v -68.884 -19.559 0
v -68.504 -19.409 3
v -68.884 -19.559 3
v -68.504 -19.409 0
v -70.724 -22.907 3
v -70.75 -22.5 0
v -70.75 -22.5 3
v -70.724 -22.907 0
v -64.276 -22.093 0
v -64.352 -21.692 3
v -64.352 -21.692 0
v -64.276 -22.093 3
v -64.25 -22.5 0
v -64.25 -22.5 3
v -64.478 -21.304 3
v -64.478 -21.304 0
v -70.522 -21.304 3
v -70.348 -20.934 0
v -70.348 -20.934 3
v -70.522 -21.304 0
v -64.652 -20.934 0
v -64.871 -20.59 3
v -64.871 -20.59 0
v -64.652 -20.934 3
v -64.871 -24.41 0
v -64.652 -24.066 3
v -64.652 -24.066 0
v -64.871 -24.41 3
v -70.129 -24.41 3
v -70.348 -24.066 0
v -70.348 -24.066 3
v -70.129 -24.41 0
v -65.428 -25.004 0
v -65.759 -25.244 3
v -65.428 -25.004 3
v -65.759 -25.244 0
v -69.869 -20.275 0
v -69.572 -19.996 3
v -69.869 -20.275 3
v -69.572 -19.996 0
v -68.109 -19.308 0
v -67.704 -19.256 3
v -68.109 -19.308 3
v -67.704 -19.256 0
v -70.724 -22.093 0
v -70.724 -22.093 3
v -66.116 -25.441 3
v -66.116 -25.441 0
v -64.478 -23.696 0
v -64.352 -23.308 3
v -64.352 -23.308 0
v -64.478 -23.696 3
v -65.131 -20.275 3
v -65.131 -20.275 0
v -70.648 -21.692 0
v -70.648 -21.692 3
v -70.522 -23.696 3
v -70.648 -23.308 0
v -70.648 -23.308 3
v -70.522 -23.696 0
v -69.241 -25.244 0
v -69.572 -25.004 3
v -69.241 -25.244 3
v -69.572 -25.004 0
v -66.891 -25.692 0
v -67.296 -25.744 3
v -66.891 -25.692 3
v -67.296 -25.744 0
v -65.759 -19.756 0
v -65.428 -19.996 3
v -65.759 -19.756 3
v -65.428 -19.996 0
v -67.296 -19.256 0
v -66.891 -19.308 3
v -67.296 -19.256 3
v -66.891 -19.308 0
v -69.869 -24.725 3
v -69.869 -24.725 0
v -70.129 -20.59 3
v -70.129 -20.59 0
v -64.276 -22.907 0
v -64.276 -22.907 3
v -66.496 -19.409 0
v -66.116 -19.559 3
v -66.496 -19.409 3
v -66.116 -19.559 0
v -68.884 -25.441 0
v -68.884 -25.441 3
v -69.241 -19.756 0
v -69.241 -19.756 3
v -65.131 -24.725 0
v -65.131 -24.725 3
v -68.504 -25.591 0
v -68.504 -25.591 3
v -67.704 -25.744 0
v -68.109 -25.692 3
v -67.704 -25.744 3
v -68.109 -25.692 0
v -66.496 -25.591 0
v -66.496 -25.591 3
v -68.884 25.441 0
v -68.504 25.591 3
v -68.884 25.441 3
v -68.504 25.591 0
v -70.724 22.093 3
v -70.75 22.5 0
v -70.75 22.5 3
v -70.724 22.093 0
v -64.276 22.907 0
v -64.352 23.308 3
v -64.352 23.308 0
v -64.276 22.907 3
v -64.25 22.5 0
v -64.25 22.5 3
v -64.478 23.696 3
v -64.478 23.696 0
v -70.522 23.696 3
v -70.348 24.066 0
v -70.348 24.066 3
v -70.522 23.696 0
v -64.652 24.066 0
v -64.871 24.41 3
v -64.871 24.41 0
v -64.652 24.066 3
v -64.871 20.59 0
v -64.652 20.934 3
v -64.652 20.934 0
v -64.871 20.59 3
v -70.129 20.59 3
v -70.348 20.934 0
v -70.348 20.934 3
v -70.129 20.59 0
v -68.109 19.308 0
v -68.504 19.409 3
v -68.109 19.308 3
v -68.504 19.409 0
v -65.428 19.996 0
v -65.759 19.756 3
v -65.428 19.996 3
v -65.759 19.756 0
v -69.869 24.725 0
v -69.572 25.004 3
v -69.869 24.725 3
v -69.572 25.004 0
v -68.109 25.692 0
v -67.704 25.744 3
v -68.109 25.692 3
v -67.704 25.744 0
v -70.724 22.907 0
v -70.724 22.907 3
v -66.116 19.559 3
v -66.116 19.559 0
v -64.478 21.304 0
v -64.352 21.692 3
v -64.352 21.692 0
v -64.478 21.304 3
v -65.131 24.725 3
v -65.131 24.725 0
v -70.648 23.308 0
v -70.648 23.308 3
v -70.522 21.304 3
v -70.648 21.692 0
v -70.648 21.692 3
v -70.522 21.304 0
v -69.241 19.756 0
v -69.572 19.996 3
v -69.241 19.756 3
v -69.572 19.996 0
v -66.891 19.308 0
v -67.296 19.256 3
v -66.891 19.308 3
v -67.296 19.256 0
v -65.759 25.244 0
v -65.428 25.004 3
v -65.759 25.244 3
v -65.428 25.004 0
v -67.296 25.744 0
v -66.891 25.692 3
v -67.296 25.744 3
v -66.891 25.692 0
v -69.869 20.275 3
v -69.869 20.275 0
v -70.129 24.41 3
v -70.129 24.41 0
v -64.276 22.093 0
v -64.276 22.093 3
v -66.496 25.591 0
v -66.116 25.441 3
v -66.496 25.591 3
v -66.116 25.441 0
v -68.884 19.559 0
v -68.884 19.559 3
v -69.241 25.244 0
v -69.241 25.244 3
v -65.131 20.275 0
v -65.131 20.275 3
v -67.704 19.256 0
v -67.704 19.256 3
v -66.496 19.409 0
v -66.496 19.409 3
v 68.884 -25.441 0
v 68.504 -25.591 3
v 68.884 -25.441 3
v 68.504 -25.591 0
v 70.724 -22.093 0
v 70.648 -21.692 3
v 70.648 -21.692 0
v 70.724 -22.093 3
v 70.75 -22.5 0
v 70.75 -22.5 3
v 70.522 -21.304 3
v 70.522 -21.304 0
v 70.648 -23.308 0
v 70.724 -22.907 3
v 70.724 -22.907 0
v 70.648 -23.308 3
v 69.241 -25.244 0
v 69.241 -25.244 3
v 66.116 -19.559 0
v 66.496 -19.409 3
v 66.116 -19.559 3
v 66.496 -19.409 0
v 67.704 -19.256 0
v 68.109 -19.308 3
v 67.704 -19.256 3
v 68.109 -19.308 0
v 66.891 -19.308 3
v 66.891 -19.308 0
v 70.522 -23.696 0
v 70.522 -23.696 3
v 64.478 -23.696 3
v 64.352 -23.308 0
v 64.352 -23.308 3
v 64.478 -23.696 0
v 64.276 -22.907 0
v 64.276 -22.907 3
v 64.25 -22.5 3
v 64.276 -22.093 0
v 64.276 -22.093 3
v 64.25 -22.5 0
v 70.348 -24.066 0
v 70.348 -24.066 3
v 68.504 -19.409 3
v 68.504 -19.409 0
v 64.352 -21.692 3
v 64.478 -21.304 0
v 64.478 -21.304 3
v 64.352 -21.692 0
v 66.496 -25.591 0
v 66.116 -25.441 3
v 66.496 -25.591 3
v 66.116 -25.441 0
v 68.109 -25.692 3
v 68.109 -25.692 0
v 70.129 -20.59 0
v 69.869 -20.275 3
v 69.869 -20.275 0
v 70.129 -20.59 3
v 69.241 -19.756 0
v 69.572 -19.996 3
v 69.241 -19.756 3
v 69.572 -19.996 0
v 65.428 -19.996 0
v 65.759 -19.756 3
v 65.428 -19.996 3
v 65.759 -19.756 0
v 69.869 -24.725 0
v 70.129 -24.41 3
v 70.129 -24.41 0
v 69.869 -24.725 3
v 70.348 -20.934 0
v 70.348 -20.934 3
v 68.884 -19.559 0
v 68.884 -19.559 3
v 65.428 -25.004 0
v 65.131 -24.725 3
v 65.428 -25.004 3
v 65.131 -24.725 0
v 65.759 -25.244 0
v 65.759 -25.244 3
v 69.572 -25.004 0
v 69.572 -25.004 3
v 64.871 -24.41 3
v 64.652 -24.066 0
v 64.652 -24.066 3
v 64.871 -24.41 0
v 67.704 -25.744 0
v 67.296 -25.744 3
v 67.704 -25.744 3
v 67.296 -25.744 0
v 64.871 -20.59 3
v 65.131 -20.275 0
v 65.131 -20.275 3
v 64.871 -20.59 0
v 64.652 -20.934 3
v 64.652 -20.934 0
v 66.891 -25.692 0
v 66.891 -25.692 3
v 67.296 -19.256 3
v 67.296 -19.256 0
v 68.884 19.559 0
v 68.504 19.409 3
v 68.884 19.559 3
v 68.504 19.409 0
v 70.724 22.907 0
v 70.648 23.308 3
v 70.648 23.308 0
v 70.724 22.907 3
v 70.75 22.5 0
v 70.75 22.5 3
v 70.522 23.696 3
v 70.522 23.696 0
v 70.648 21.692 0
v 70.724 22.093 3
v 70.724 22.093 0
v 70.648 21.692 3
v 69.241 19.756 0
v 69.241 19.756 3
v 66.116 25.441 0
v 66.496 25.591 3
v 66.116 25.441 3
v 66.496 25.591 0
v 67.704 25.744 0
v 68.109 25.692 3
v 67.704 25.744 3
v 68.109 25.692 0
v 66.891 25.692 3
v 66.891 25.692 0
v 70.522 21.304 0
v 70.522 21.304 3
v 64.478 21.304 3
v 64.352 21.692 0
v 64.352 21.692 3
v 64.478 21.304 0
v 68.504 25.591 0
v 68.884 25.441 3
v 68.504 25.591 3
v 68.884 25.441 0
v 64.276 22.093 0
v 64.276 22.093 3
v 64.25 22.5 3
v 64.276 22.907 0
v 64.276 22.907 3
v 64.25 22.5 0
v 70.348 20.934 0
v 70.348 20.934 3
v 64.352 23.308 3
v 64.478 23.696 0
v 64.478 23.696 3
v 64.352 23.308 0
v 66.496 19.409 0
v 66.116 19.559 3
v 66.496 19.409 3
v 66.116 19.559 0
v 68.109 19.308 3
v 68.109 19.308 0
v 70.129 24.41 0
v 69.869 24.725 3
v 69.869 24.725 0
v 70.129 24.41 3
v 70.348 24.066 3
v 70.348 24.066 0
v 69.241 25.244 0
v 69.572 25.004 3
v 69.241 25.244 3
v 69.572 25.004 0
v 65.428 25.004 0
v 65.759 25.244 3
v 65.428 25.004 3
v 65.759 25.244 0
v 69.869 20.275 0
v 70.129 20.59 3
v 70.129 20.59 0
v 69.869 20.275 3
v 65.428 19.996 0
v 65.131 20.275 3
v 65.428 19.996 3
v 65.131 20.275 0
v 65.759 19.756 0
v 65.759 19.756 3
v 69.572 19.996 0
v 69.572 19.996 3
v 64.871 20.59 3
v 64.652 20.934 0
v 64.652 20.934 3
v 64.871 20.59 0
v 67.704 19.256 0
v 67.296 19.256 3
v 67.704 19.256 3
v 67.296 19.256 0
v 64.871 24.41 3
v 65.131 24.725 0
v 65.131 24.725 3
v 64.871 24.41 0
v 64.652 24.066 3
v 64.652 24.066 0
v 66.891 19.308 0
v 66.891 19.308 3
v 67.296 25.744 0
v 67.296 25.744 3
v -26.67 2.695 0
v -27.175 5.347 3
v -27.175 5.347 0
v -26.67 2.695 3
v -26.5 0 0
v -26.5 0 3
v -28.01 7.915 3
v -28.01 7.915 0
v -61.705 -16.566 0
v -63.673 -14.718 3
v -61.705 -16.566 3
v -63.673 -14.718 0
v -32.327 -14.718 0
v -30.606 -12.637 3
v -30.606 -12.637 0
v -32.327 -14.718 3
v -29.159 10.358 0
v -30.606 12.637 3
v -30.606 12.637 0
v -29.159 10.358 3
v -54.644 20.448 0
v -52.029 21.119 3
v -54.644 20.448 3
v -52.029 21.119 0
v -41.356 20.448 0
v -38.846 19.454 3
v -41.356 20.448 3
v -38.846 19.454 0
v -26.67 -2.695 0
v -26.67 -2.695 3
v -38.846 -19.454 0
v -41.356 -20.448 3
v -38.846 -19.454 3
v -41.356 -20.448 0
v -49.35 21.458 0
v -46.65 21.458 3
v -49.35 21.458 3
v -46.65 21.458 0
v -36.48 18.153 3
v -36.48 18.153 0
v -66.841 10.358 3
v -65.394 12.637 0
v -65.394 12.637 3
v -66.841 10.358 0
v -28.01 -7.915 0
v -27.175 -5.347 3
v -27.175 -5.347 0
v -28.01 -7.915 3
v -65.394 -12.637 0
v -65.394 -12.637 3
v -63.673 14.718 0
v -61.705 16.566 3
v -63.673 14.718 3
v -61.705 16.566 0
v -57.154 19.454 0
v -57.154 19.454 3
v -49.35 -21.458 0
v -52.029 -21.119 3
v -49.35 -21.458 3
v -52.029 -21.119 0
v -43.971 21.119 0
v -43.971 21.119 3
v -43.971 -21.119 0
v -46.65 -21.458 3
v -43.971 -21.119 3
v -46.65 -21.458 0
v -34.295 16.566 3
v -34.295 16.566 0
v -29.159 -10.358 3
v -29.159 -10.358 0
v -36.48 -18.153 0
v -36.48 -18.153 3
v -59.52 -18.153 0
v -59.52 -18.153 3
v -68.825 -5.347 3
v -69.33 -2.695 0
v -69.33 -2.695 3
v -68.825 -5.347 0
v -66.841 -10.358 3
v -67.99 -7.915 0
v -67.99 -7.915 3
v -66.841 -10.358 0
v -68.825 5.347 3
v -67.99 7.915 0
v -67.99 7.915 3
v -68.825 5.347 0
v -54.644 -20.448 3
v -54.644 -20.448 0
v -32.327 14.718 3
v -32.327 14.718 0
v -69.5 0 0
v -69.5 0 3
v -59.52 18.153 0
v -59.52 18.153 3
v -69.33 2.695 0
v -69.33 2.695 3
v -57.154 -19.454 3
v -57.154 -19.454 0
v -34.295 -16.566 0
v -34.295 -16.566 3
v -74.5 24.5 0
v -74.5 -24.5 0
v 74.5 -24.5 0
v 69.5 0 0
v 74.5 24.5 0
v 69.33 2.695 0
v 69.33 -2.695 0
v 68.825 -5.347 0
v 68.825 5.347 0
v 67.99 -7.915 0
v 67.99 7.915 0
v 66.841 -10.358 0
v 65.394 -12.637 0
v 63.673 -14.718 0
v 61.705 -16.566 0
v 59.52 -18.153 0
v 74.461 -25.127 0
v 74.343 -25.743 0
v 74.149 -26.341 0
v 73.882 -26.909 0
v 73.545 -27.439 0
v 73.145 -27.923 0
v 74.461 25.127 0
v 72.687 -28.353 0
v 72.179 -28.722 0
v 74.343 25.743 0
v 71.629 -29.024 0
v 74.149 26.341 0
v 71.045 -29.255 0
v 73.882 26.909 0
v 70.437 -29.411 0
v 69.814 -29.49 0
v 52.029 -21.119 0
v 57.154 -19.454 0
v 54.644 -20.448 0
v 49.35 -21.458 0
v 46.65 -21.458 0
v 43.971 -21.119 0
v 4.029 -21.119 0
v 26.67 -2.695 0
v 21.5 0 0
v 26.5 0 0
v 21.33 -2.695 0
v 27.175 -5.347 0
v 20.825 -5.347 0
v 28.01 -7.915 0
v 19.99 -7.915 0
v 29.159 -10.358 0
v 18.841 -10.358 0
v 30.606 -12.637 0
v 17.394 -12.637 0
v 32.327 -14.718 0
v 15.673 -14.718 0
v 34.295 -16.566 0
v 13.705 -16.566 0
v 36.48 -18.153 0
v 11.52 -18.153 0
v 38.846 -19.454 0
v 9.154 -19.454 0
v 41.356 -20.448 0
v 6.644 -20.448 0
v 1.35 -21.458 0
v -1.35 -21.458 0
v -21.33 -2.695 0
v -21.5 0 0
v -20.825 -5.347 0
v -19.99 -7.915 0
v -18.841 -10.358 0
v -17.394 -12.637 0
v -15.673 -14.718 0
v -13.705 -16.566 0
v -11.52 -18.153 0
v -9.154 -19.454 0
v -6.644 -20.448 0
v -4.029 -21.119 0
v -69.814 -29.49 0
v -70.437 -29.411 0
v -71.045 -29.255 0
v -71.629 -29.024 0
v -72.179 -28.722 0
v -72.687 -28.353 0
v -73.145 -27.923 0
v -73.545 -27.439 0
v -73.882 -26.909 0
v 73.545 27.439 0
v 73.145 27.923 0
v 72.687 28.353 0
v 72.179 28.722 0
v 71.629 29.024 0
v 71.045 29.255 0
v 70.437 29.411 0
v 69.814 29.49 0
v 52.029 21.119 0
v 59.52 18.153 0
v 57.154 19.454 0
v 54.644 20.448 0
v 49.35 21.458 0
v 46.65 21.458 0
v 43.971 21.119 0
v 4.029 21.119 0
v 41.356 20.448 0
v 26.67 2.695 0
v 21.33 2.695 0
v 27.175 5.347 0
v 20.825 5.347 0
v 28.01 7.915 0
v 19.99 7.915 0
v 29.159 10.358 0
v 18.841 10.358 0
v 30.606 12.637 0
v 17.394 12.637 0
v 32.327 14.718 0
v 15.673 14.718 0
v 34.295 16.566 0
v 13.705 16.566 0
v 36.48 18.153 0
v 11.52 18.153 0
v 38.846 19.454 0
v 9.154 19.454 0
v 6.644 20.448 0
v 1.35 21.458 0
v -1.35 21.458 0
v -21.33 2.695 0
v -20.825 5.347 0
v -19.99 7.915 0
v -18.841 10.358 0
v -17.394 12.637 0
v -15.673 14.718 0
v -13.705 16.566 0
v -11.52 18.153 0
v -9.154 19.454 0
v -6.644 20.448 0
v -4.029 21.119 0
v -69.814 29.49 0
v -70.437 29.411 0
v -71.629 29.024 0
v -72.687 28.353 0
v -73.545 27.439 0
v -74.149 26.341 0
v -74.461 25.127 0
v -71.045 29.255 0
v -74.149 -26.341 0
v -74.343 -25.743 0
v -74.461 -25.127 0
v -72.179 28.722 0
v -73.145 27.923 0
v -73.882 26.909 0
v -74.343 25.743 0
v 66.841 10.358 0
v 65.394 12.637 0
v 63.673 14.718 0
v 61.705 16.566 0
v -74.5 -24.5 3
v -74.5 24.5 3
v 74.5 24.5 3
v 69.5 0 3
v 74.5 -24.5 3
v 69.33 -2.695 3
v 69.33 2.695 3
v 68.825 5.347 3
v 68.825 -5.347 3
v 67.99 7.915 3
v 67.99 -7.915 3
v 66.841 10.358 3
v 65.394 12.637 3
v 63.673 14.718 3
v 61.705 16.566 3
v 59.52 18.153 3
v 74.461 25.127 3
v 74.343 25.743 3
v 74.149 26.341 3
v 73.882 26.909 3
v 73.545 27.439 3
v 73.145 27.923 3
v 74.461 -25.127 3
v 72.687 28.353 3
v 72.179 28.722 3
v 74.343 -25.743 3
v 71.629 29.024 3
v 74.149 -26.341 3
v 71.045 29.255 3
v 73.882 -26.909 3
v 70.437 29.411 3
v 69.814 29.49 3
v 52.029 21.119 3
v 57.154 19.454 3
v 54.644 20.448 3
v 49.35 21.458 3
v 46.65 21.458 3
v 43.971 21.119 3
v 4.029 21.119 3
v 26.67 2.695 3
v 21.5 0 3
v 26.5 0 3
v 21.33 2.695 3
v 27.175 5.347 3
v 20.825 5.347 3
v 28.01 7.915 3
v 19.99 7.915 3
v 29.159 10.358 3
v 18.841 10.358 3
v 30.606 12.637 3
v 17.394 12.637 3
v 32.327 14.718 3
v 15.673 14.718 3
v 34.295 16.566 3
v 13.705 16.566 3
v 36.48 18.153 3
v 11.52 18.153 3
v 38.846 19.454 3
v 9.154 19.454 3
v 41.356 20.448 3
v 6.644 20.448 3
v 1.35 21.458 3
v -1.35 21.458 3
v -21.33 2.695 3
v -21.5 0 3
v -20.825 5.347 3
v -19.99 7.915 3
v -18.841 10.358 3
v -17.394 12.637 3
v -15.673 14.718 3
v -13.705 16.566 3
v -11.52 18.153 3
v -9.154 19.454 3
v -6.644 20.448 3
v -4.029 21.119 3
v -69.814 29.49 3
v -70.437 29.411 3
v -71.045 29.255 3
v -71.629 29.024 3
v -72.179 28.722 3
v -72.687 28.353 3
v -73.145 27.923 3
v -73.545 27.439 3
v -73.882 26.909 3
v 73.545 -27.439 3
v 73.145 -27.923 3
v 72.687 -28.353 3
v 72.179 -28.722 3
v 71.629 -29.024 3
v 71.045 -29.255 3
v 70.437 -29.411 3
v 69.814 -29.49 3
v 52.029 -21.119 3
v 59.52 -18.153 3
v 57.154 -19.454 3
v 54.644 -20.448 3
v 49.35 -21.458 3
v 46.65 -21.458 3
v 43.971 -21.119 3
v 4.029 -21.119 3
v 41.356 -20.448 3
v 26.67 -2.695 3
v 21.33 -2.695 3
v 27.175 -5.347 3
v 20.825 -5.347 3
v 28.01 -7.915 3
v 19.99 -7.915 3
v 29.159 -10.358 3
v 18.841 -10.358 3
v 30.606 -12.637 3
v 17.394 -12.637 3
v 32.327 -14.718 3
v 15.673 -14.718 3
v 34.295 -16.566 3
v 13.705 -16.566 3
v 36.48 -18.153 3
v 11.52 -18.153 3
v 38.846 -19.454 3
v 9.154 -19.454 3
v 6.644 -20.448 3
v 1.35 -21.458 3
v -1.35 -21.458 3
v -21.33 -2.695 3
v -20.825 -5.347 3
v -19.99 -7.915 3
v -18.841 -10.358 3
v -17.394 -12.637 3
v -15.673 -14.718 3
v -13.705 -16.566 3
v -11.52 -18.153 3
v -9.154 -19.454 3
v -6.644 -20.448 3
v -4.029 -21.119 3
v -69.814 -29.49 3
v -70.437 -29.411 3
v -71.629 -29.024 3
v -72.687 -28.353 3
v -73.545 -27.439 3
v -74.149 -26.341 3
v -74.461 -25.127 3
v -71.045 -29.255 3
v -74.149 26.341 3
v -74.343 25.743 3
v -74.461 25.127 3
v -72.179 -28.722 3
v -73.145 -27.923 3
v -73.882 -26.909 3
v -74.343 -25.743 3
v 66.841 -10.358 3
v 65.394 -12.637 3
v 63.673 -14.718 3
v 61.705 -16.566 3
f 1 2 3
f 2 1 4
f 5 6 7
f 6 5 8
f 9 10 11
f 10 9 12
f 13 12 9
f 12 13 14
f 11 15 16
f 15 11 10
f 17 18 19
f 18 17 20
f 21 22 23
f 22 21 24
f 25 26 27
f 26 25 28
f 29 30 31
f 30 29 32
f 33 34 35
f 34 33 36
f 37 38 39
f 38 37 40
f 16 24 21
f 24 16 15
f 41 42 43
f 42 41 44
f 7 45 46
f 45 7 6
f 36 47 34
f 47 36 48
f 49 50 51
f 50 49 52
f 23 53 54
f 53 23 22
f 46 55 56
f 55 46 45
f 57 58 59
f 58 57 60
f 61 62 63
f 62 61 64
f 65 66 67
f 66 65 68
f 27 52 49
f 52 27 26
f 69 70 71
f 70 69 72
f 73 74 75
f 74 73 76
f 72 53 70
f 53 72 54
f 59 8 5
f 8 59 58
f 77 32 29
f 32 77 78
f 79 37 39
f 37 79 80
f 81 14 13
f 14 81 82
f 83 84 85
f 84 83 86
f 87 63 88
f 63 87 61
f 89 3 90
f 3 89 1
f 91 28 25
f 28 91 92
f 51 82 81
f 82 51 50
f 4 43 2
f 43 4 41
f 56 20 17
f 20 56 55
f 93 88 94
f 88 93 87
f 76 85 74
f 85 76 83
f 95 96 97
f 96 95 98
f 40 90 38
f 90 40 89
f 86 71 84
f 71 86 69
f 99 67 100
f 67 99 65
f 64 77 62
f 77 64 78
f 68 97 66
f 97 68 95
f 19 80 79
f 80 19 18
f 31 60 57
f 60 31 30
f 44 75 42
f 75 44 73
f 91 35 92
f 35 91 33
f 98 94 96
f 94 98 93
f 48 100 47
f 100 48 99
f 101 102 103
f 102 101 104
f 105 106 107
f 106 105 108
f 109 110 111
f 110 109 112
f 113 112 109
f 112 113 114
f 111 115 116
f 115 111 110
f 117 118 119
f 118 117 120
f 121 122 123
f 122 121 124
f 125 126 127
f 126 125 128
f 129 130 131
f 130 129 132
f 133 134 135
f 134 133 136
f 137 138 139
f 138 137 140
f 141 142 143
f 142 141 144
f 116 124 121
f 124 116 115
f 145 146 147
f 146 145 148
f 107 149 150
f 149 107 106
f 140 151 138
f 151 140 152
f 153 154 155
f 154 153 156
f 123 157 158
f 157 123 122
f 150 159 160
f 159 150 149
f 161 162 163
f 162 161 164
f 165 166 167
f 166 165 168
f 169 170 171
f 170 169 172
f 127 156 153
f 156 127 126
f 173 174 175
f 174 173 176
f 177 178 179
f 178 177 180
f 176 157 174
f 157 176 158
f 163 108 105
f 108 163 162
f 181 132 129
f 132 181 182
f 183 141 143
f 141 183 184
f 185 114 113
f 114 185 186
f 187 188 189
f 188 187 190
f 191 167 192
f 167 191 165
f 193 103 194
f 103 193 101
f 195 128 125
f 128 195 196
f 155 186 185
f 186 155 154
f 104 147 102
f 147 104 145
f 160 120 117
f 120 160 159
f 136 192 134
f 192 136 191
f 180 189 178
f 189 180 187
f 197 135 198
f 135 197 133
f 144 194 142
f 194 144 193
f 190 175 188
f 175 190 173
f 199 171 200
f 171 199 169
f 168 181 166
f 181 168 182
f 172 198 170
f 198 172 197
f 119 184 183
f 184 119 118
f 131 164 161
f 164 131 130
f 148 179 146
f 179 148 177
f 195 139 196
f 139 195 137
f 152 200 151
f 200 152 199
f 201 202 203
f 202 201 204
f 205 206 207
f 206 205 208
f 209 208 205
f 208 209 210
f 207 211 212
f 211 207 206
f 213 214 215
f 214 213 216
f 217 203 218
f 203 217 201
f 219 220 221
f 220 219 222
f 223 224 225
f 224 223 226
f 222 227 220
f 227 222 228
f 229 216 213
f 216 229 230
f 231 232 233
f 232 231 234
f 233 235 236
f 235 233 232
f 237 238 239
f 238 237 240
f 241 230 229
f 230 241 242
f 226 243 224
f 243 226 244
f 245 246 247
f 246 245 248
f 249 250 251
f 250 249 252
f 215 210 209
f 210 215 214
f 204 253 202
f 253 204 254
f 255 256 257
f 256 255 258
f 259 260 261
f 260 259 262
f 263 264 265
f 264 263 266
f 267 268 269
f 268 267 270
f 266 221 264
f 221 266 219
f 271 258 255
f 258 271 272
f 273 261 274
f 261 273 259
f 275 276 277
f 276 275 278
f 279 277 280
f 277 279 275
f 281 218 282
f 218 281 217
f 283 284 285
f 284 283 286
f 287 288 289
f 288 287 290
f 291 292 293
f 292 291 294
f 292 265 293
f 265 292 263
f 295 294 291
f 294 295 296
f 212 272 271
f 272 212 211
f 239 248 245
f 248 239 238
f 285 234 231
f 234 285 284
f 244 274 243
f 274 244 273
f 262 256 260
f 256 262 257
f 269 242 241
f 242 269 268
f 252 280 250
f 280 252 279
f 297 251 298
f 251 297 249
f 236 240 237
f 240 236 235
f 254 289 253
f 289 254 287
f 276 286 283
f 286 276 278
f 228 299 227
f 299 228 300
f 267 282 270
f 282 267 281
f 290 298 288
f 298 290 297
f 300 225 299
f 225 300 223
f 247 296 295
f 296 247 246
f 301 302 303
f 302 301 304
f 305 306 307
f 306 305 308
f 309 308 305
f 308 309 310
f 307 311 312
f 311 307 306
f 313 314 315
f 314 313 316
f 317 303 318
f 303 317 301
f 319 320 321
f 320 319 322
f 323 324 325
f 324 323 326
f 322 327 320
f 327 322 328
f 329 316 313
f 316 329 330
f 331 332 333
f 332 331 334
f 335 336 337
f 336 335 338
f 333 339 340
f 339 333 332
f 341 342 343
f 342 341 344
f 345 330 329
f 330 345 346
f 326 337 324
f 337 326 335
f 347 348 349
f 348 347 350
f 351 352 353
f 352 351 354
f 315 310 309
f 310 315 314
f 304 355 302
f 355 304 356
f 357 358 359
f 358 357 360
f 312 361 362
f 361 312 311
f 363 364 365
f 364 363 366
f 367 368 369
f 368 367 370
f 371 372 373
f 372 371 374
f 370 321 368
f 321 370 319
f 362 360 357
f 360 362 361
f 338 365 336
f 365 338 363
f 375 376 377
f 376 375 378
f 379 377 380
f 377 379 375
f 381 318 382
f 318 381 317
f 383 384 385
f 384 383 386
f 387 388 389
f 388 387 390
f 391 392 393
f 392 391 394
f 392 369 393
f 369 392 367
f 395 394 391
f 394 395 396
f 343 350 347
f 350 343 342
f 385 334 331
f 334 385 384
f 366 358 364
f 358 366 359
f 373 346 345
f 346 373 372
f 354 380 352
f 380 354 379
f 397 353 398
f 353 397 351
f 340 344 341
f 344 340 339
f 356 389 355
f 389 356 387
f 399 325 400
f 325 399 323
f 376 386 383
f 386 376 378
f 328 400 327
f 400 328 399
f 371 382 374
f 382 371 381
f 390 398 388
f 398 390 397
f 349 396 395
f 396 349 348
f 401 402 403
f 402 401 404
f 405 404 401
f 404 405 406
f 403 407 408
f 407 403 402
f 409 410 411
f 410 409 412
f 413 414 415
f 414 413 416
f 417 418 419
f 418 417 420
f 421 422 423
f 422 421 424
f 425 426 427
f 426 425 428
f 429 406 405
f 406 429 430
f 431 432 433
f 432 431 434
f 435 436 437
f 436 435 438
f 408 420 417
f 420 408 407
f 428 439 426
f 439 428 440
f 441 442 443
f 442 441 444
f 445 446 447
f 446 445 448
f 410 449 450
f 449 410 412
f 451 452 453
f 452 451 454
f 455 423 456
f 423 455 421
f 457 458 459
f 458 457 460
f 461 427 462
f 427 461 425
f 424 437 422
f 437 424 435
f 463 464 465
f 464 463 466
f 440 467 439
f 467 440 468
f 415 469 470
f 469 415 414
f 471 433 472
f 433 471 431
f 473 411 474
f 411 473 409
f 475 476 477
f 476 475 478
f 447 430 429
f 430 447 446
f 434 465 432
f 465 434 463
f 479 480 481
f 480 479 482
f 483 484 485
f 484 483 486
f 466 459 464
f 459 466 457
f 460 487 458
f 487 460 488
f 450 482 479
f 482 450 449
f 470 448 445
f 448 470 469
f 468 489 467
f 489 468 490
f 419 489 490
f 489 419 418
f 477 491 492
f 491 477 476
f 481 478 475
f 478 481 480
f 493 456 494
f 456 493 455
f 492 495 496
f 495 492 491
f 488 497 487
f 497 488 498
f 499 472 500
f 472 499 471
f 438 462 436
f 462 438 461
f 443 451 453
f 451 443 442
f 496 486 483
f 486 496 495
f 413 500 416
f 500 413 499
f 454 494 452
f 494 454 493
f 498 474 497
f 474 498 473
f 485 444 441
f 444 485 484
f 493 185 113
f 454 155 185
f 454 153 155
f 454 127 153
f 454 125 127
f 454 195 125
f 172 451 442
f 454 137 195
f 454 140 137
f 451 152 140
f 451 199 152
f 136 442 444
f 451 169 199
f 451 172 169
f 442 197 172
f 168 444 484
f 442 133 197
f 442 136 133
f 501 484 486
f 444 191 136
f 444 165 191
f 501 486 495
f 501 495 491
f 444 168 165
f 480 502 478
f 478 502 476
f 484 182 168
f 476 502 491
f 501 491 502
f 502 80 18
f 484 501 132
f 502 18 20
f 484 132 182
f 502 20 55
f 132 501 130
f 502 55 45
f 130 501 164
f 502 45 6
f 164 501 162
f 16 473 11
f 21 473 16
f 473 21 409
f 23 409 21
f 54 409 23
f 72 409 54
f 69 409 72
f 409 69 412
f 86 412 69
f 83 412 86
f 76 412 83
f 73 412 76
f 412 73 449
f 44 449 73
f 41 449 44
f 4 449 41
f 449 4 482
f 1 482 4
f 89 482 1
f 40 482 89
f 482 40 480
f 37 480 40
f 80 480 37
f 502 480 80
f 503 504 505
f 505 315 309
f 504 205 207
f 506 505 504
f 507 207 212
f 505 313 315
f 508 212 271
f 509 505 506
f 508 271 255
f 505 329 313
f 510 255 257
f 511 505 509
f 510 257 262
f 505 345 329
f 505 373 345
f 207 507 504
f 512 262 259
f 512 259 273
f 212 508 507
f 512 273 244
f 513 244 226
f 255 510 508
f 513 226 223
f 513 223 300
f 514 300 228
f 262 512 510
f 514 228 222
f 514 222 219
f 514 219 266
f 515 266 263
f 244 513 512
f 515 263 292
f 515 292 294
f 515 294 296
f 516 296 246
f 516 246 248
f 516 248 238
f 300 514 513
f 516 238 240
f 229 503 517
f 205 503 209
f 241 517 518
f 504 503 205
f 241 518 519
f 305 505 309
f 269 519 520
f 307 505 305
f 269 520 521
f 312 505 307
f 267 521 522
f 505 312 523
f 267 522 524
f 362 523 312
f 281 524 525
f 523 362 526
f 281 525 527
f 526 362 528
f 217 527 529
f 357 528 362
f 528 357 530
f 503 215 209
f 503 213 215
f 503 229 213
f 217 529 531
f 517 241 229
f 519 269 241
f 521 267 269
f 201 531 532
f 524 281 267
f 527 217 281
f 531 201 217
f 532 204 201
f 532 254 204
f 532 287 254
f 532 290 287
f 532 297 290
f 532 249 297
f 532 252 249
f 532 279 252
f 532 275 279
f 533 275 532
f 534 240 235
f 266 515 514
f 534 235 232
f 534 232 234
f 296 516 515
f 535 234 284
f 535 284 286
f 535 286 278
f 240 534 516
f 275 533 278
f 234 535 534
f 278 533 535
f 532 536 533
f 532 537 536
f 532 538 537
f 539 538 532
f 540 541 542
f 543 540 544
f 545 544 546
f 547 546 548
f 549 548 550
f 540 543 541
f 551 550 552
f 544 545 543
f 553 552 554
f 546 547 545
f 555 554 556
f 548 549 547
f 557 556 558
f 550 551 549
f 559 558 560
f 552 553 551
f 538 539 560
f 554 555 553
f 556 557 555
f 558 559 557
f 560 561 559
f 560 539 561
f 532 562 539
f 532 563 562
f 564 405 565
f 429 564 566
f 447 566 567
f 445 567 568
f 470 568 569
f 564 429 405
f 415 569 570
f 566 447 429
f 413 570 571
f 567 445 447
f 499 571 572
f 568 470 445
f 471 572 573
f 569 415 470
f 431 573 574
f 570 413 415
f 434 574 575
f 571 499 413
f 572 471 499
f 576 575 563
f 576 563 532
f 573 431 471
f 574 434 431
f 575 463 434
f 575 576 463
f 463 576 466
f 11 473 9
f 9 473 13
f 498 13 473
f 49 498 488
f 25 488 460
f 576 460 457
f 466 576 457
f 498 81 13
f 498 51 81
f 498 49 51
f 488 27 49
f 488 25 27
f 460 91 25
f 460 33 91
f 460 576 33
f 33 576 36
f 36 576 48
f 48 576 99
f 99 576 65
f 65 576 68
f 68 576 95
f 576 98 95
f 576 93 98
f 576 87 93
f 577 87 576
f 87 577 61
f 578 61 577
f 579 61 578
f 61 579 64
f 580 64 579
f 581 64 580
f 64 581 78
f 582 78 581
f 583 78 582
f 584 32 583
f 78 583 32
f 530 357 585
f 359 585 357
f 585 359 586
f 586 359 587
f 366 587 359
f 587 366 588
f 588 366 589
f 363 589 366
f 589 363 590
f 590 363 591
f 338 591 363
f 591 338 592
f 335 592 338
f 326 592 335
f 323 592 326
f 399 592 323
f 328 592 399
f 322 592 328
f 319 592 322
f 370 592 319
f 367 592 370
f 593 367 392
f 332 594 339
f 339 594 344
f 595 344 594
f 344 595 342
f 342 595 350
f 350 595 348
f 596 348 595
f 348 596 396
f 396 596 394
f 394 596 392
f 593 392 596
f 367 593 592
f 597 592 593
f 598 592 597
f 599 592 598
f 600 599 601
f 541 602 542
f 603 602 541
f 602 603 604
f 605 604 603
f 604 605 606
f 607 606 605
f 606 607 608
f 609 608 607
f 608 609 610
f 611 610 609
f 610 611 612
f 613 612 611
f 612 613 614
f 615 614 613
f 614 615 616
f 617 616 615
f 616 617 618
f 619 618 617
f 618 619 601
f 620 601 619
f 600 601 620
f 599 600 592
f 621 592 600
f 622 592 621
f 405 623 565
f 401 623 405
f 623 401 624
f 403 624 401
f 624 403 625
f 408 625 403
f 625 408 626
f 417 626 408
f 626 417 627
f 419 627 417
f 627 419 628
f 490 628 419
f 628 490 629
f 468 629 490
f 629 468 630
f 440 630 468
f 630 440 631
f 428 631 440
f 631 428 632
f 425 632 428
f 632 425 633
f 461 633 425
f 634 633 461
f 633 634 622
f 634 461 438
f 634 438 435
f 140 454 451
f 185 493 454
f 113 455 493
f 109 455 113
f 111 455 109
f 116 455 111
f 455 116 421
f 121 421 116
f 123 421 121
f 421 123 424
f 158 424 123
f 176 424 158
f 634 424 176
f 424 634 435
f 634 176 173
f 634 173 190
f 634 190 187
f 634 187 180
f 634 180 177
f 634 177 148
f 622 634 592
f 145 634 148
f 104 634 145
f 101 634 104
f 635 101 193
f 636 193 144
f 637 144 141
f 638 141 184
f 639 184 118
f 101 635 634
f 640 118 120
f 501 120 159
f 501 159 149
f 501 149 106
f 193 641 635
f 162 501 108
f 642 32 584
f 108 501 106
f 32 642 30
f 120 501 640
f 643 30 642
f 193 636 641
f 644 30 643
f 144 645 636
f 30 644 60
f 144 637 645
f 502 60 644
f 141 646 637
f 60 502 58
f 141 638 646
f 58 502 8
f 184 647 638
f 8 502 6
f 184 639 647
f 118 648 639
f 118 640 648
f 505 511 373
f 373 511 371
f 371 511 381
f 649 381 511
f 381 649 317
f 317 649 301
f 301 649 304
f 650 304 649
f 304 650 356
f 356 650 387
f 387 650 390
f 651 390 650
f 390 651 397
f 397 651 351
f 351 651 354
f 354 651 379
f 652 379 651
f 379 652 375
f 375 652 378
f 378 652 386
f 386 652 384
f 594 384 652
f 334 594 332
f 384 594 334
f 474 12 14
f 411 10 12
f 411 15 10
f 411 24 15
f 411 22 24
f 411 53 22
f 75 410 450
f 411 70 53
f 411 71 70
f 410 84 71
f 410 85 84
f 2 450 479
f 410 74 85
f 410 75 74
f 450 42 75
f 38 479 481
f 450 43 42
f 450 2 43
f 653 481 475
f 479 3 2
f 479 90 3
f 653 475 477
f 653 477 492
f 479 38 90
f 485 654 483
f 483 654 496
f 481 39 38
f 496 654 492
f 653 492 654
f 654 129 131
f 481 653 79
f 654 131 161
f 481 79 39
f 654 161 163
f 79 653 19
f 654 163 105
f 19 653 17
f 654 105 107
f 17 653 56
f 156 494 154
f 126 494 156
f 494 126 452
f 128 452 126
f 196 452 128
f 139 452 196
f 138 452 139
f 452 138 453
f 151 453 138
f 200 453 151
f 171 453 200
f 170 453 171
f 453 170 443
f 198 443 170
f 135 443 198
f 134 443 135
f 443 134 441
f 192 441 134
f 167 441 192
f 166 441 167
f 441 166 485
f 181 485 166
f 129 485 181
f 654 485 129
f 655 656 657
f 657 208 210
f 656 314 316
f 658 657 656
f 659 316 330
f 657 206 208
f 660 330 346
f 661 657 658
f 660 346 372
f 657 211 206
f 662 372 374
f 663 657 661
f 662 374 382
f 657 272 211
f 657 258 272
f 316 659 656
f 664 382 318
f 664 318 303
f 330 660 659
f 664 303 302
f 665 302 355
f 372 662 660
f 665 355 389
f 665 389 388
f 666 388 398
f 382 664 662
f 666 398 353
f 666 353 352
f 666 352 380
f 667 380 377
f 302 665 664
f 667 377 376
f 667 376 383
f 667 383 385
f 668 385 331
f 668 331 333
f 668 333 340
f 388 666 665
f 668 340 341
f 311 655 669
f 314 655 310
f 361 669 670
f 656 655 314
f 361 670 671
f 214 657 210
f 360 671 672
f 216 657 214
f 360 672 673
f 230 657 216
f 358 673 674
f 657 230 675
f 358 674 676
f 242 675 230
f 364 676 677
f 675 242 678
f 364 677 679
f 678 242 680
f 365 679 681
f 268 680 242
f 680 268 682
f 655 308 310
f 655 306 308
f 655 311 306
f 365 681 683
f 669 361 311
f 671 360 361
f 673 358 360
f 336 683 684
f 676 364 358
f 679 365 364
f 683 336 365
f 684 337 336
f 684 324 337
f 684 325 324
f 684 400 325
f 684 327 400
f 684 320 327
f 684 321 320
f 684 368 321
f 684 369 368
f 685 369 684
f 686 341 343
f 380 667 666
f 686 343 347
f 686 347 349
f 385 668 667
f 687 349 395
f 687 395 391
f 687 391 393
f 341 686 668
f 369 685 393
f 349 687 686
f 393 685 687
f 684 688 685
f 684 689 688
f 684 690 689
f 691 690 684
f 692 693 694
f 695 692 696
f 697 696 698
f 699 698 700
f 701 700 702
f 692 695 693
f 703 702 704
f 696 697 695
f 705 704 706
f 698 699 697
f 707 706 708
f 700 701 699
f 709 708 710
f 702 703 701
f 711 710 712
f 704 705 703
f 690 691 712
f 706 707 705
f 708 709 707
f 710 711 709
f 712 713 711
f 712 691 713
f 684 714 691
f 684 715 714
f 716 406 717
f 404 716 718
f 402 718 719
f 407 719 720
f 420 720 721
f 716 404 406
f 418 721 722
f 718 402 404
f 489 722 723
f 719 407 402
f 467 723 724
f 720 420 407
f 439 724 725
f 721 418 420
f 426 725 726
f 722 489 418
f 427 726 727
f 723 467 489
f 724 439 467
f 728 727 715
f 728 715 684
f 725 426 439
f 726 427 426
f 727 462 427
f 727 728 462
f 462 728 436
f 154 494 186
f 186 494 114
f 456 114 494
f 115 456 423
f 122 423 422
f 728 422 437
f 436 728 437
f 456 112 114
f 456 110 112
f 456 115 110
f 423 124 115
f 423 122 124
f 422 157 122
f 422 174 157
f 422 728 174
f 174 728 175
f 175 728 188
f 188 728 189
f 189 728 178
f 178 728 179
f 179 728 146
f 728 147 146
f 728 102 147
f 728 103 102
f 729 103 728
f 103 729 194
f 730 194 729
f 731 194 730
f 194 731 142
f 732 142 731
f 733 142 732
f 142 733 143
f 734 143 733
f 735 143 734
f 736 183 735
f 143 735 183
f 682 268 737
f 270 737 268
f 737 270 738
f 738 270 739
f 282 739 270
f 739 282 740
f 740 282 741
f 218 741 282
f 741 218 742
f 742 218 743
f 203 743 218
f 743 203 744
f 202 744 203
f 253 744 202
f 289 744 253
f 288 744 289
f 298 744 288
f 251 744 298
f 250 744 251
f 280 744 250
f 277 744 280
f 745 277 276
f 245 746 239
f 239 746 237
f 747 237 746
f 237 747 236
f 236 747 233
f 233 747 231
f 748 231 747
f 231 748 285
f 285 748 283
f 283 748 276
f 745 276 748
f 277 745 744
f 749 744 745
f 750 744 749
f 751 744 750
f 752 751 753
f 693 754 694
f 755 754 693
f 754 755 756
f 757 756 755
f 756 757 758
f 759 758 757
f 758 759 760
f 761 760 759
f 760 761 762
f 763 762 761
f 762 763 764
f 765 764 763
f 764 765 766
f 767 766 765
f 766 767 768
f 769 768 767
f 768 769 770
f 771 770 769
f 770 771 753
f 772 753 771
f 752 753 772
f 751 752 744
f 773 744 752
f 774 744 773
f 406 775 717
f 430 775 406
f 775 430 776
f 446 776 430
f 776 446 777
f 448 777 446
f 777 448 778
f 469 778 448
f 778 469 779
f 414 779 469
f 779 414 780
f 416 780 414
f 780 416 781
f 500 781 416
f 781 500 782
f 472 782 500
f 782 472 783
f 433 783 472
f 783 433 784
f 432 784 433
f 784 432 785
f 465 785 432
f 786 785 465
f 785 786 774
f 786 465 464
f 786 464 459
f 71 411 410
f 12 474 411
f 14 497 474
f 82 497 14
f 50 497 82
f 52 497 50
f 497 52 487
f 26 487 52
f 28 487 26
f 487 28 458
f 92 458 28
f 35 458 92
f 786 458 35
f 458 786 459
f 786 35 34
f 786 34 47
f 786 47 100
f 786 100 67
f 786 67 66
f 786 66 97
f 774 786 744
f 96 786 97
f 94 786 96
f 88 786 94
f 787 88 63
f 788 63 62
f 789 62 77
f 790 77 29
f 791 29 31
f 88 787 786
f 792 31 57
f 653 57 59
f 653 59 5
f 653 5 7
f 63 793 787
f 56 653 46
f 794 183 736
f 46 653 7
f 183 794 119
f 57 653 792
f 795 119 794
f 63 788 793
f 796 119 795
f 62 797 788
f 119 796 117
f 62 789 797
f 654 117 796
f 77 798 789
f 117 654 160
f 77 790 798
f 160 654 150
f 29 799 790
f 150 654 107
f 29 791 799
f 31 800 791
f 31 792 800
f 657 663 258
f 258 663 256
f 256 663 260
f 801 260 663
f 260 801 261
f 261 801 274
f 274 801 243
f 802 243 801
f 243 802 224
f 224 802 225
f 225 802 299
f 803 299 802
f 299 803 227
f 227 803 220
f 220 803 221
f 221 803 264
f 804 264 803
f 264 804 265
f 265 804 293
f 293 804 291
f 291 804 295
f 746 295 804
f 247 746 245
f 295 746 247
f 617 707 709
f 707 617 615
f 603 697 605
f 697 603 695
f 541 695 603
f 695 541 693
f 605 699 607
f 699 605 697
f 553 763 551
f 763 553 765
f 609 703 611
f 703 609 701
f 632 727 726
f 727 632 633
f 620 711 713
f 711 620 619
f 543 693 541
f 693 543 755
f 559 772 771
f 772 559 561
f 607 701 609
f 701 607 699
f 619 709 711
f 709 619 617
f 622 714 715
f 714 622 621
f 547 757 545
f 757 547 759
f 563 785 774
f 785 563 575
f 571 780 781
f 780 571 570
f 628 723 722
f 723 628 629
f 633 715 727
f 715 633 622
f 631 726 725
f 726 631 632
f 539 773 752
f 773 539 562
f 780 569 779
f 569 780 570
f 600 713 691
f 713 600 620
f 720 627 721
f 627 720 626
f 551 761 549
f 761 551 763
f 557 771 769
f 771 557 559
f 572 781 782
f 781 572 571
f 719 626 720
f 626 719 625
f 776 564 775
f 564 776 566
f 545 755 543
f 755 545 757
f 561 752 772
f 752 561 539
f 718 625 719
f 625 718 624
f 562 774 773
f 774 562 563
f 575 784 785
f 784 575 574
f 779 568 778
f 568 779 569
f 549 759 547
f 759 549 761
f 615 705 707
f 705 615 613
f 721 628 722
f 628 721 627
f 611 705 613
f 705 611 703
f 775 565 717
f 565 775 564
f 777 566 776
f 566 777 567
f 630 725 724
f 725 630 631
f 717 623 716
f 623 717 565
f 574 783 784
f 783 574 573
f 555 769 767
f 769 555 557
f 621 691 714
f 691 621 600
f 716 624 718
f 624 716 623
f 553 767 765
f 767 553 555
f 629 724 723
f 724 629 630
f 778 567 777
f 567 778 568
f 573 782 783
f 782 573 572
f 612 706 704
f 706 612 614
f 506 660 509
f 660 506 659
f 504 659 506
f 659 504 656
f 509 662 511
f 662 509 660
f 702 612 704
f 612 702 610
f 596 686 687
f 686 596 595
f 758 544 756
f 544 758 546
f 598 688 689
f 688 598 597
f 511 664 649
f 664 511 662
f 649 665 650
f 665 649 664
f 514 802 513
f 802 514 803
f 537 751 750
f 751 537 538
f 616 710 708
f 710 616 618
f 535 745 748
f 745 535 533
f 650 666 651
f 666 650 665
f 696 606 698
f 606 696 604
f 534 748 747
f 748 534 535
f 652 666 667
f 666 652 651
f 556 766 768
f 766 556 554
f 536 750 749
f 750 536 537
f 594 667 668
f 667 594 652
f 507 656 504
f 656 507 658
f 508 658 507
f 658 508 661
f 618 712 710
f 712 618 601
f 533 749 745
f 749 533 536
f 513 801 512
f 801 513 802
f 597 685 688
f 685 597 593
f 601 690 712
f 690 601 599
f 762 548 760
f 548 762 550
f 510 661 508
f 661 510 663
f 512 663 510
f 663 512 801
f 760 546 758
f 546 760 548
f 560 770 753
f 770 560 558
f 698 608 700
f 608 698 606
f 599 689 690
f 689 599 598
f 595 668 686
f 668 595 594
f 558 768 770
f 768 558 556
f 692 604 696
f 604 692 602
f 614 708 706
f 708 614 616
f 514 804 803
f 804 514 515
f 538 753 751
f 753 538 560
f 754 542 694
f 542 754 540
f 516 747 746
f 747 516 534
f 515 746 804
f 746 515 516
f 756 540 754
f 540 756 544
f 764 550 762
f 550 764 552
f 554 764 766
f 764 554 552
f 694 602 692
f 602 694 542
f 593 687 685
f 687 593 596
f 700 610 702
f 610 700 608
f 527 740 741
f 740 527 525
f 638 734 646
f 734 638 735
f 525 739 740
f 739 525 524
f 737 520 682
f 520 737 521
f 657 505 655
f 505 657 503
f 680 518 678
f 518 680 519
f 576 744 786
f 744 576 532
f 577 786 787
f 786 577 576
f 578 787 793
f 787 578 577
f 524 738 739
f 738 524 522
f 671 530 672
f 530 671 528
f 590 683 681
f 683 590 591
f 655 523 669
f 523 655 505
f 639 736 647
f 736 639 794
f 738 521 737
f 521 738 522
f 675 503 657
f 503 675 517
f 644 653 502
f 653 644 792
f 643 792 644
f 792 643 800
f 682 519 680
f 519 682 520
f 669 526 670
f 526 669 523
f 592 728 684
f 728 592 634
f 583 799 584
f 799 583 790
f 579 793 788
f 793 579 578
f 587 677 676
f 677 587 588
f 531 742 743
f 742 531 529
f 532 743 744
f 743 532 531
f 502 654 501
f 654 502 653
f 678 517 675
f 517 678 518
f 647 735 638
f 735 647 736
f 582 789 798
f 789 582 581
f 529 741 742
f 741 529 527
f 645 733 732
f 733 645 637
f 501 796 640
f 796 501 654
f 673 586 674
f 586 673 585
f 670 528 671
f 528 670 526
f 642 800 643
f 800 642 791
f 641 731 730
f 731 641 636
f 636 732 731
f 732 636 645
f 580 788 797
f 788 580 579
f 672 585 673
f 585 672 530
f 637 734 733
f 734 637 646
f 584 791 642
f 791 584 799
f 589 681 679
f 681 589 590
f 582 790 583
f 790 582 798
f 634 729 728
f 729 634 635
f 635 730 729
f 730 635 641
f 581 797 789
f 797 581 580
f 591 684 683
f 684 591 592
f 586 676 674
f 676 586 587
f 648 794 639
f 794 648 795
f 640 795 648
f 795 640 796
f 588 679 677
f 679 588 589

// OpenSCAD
$fn = 50;

difference() {
	union() {
		hull() {
			translate(v = [-69.5, 24.5, 0]) {
				cylinder(h = 3, r = 5);
			}
			translate(v = [69.5, 24.5, 0]) {
				cylinder(h = 3, r = 5);
			}
			translate(v = [-69.5, -24.5, 0]) {
				cylinder(h = 3, r = 5);
			}
			translate(v = [69.5, -24.5, 0]) {
				cylinder(h = 3, r = 5);
			}
		}
	}
	union() {
		translate(v = [-67.5, -22.5, -100.0]) {
			cylinder(h = 200, r = 3.25);
		}
		translate(v = [-67.5, 22.5, -100.0]) {
			cylinder(h = 200, r = 3.25);
		}
		translate(v = [67.5, -22.5, -100.0]) {
			cylinder(h = 200, r = 3.25);
		}
		translate(v = [67.5, 22.5, -100.0]) {
			cylinder(h = 200, r = 3.25);
		}
		translate(v = [-67.5, -22.5, -100.0]) {
			cylinder(h = 200, r = 1.8);
		}
		translate(v = [-67.5, 22.5, -100.0]) {
			cylinder(h = 200, r = 1.8);
		}
		translate(v = [67.5, -22.5, -100.0]) {
			cylinder(h = 200, r = 1.8);
		}
		translate(v = [67.5, 22.5, -100.0]) {
			cylinder(h = 200, r = 1.8);
		}
		translate(v = [-48.0, 0, 0.0]) {
			cylinder(h = 3, r = 21.5);
		}
		cylinder(h = 3, r = 21.5);
		translate(v = [48.0, 0, 0.0]) {
			cylinder(h = 3, r = 21.5);
		}
	}
}
